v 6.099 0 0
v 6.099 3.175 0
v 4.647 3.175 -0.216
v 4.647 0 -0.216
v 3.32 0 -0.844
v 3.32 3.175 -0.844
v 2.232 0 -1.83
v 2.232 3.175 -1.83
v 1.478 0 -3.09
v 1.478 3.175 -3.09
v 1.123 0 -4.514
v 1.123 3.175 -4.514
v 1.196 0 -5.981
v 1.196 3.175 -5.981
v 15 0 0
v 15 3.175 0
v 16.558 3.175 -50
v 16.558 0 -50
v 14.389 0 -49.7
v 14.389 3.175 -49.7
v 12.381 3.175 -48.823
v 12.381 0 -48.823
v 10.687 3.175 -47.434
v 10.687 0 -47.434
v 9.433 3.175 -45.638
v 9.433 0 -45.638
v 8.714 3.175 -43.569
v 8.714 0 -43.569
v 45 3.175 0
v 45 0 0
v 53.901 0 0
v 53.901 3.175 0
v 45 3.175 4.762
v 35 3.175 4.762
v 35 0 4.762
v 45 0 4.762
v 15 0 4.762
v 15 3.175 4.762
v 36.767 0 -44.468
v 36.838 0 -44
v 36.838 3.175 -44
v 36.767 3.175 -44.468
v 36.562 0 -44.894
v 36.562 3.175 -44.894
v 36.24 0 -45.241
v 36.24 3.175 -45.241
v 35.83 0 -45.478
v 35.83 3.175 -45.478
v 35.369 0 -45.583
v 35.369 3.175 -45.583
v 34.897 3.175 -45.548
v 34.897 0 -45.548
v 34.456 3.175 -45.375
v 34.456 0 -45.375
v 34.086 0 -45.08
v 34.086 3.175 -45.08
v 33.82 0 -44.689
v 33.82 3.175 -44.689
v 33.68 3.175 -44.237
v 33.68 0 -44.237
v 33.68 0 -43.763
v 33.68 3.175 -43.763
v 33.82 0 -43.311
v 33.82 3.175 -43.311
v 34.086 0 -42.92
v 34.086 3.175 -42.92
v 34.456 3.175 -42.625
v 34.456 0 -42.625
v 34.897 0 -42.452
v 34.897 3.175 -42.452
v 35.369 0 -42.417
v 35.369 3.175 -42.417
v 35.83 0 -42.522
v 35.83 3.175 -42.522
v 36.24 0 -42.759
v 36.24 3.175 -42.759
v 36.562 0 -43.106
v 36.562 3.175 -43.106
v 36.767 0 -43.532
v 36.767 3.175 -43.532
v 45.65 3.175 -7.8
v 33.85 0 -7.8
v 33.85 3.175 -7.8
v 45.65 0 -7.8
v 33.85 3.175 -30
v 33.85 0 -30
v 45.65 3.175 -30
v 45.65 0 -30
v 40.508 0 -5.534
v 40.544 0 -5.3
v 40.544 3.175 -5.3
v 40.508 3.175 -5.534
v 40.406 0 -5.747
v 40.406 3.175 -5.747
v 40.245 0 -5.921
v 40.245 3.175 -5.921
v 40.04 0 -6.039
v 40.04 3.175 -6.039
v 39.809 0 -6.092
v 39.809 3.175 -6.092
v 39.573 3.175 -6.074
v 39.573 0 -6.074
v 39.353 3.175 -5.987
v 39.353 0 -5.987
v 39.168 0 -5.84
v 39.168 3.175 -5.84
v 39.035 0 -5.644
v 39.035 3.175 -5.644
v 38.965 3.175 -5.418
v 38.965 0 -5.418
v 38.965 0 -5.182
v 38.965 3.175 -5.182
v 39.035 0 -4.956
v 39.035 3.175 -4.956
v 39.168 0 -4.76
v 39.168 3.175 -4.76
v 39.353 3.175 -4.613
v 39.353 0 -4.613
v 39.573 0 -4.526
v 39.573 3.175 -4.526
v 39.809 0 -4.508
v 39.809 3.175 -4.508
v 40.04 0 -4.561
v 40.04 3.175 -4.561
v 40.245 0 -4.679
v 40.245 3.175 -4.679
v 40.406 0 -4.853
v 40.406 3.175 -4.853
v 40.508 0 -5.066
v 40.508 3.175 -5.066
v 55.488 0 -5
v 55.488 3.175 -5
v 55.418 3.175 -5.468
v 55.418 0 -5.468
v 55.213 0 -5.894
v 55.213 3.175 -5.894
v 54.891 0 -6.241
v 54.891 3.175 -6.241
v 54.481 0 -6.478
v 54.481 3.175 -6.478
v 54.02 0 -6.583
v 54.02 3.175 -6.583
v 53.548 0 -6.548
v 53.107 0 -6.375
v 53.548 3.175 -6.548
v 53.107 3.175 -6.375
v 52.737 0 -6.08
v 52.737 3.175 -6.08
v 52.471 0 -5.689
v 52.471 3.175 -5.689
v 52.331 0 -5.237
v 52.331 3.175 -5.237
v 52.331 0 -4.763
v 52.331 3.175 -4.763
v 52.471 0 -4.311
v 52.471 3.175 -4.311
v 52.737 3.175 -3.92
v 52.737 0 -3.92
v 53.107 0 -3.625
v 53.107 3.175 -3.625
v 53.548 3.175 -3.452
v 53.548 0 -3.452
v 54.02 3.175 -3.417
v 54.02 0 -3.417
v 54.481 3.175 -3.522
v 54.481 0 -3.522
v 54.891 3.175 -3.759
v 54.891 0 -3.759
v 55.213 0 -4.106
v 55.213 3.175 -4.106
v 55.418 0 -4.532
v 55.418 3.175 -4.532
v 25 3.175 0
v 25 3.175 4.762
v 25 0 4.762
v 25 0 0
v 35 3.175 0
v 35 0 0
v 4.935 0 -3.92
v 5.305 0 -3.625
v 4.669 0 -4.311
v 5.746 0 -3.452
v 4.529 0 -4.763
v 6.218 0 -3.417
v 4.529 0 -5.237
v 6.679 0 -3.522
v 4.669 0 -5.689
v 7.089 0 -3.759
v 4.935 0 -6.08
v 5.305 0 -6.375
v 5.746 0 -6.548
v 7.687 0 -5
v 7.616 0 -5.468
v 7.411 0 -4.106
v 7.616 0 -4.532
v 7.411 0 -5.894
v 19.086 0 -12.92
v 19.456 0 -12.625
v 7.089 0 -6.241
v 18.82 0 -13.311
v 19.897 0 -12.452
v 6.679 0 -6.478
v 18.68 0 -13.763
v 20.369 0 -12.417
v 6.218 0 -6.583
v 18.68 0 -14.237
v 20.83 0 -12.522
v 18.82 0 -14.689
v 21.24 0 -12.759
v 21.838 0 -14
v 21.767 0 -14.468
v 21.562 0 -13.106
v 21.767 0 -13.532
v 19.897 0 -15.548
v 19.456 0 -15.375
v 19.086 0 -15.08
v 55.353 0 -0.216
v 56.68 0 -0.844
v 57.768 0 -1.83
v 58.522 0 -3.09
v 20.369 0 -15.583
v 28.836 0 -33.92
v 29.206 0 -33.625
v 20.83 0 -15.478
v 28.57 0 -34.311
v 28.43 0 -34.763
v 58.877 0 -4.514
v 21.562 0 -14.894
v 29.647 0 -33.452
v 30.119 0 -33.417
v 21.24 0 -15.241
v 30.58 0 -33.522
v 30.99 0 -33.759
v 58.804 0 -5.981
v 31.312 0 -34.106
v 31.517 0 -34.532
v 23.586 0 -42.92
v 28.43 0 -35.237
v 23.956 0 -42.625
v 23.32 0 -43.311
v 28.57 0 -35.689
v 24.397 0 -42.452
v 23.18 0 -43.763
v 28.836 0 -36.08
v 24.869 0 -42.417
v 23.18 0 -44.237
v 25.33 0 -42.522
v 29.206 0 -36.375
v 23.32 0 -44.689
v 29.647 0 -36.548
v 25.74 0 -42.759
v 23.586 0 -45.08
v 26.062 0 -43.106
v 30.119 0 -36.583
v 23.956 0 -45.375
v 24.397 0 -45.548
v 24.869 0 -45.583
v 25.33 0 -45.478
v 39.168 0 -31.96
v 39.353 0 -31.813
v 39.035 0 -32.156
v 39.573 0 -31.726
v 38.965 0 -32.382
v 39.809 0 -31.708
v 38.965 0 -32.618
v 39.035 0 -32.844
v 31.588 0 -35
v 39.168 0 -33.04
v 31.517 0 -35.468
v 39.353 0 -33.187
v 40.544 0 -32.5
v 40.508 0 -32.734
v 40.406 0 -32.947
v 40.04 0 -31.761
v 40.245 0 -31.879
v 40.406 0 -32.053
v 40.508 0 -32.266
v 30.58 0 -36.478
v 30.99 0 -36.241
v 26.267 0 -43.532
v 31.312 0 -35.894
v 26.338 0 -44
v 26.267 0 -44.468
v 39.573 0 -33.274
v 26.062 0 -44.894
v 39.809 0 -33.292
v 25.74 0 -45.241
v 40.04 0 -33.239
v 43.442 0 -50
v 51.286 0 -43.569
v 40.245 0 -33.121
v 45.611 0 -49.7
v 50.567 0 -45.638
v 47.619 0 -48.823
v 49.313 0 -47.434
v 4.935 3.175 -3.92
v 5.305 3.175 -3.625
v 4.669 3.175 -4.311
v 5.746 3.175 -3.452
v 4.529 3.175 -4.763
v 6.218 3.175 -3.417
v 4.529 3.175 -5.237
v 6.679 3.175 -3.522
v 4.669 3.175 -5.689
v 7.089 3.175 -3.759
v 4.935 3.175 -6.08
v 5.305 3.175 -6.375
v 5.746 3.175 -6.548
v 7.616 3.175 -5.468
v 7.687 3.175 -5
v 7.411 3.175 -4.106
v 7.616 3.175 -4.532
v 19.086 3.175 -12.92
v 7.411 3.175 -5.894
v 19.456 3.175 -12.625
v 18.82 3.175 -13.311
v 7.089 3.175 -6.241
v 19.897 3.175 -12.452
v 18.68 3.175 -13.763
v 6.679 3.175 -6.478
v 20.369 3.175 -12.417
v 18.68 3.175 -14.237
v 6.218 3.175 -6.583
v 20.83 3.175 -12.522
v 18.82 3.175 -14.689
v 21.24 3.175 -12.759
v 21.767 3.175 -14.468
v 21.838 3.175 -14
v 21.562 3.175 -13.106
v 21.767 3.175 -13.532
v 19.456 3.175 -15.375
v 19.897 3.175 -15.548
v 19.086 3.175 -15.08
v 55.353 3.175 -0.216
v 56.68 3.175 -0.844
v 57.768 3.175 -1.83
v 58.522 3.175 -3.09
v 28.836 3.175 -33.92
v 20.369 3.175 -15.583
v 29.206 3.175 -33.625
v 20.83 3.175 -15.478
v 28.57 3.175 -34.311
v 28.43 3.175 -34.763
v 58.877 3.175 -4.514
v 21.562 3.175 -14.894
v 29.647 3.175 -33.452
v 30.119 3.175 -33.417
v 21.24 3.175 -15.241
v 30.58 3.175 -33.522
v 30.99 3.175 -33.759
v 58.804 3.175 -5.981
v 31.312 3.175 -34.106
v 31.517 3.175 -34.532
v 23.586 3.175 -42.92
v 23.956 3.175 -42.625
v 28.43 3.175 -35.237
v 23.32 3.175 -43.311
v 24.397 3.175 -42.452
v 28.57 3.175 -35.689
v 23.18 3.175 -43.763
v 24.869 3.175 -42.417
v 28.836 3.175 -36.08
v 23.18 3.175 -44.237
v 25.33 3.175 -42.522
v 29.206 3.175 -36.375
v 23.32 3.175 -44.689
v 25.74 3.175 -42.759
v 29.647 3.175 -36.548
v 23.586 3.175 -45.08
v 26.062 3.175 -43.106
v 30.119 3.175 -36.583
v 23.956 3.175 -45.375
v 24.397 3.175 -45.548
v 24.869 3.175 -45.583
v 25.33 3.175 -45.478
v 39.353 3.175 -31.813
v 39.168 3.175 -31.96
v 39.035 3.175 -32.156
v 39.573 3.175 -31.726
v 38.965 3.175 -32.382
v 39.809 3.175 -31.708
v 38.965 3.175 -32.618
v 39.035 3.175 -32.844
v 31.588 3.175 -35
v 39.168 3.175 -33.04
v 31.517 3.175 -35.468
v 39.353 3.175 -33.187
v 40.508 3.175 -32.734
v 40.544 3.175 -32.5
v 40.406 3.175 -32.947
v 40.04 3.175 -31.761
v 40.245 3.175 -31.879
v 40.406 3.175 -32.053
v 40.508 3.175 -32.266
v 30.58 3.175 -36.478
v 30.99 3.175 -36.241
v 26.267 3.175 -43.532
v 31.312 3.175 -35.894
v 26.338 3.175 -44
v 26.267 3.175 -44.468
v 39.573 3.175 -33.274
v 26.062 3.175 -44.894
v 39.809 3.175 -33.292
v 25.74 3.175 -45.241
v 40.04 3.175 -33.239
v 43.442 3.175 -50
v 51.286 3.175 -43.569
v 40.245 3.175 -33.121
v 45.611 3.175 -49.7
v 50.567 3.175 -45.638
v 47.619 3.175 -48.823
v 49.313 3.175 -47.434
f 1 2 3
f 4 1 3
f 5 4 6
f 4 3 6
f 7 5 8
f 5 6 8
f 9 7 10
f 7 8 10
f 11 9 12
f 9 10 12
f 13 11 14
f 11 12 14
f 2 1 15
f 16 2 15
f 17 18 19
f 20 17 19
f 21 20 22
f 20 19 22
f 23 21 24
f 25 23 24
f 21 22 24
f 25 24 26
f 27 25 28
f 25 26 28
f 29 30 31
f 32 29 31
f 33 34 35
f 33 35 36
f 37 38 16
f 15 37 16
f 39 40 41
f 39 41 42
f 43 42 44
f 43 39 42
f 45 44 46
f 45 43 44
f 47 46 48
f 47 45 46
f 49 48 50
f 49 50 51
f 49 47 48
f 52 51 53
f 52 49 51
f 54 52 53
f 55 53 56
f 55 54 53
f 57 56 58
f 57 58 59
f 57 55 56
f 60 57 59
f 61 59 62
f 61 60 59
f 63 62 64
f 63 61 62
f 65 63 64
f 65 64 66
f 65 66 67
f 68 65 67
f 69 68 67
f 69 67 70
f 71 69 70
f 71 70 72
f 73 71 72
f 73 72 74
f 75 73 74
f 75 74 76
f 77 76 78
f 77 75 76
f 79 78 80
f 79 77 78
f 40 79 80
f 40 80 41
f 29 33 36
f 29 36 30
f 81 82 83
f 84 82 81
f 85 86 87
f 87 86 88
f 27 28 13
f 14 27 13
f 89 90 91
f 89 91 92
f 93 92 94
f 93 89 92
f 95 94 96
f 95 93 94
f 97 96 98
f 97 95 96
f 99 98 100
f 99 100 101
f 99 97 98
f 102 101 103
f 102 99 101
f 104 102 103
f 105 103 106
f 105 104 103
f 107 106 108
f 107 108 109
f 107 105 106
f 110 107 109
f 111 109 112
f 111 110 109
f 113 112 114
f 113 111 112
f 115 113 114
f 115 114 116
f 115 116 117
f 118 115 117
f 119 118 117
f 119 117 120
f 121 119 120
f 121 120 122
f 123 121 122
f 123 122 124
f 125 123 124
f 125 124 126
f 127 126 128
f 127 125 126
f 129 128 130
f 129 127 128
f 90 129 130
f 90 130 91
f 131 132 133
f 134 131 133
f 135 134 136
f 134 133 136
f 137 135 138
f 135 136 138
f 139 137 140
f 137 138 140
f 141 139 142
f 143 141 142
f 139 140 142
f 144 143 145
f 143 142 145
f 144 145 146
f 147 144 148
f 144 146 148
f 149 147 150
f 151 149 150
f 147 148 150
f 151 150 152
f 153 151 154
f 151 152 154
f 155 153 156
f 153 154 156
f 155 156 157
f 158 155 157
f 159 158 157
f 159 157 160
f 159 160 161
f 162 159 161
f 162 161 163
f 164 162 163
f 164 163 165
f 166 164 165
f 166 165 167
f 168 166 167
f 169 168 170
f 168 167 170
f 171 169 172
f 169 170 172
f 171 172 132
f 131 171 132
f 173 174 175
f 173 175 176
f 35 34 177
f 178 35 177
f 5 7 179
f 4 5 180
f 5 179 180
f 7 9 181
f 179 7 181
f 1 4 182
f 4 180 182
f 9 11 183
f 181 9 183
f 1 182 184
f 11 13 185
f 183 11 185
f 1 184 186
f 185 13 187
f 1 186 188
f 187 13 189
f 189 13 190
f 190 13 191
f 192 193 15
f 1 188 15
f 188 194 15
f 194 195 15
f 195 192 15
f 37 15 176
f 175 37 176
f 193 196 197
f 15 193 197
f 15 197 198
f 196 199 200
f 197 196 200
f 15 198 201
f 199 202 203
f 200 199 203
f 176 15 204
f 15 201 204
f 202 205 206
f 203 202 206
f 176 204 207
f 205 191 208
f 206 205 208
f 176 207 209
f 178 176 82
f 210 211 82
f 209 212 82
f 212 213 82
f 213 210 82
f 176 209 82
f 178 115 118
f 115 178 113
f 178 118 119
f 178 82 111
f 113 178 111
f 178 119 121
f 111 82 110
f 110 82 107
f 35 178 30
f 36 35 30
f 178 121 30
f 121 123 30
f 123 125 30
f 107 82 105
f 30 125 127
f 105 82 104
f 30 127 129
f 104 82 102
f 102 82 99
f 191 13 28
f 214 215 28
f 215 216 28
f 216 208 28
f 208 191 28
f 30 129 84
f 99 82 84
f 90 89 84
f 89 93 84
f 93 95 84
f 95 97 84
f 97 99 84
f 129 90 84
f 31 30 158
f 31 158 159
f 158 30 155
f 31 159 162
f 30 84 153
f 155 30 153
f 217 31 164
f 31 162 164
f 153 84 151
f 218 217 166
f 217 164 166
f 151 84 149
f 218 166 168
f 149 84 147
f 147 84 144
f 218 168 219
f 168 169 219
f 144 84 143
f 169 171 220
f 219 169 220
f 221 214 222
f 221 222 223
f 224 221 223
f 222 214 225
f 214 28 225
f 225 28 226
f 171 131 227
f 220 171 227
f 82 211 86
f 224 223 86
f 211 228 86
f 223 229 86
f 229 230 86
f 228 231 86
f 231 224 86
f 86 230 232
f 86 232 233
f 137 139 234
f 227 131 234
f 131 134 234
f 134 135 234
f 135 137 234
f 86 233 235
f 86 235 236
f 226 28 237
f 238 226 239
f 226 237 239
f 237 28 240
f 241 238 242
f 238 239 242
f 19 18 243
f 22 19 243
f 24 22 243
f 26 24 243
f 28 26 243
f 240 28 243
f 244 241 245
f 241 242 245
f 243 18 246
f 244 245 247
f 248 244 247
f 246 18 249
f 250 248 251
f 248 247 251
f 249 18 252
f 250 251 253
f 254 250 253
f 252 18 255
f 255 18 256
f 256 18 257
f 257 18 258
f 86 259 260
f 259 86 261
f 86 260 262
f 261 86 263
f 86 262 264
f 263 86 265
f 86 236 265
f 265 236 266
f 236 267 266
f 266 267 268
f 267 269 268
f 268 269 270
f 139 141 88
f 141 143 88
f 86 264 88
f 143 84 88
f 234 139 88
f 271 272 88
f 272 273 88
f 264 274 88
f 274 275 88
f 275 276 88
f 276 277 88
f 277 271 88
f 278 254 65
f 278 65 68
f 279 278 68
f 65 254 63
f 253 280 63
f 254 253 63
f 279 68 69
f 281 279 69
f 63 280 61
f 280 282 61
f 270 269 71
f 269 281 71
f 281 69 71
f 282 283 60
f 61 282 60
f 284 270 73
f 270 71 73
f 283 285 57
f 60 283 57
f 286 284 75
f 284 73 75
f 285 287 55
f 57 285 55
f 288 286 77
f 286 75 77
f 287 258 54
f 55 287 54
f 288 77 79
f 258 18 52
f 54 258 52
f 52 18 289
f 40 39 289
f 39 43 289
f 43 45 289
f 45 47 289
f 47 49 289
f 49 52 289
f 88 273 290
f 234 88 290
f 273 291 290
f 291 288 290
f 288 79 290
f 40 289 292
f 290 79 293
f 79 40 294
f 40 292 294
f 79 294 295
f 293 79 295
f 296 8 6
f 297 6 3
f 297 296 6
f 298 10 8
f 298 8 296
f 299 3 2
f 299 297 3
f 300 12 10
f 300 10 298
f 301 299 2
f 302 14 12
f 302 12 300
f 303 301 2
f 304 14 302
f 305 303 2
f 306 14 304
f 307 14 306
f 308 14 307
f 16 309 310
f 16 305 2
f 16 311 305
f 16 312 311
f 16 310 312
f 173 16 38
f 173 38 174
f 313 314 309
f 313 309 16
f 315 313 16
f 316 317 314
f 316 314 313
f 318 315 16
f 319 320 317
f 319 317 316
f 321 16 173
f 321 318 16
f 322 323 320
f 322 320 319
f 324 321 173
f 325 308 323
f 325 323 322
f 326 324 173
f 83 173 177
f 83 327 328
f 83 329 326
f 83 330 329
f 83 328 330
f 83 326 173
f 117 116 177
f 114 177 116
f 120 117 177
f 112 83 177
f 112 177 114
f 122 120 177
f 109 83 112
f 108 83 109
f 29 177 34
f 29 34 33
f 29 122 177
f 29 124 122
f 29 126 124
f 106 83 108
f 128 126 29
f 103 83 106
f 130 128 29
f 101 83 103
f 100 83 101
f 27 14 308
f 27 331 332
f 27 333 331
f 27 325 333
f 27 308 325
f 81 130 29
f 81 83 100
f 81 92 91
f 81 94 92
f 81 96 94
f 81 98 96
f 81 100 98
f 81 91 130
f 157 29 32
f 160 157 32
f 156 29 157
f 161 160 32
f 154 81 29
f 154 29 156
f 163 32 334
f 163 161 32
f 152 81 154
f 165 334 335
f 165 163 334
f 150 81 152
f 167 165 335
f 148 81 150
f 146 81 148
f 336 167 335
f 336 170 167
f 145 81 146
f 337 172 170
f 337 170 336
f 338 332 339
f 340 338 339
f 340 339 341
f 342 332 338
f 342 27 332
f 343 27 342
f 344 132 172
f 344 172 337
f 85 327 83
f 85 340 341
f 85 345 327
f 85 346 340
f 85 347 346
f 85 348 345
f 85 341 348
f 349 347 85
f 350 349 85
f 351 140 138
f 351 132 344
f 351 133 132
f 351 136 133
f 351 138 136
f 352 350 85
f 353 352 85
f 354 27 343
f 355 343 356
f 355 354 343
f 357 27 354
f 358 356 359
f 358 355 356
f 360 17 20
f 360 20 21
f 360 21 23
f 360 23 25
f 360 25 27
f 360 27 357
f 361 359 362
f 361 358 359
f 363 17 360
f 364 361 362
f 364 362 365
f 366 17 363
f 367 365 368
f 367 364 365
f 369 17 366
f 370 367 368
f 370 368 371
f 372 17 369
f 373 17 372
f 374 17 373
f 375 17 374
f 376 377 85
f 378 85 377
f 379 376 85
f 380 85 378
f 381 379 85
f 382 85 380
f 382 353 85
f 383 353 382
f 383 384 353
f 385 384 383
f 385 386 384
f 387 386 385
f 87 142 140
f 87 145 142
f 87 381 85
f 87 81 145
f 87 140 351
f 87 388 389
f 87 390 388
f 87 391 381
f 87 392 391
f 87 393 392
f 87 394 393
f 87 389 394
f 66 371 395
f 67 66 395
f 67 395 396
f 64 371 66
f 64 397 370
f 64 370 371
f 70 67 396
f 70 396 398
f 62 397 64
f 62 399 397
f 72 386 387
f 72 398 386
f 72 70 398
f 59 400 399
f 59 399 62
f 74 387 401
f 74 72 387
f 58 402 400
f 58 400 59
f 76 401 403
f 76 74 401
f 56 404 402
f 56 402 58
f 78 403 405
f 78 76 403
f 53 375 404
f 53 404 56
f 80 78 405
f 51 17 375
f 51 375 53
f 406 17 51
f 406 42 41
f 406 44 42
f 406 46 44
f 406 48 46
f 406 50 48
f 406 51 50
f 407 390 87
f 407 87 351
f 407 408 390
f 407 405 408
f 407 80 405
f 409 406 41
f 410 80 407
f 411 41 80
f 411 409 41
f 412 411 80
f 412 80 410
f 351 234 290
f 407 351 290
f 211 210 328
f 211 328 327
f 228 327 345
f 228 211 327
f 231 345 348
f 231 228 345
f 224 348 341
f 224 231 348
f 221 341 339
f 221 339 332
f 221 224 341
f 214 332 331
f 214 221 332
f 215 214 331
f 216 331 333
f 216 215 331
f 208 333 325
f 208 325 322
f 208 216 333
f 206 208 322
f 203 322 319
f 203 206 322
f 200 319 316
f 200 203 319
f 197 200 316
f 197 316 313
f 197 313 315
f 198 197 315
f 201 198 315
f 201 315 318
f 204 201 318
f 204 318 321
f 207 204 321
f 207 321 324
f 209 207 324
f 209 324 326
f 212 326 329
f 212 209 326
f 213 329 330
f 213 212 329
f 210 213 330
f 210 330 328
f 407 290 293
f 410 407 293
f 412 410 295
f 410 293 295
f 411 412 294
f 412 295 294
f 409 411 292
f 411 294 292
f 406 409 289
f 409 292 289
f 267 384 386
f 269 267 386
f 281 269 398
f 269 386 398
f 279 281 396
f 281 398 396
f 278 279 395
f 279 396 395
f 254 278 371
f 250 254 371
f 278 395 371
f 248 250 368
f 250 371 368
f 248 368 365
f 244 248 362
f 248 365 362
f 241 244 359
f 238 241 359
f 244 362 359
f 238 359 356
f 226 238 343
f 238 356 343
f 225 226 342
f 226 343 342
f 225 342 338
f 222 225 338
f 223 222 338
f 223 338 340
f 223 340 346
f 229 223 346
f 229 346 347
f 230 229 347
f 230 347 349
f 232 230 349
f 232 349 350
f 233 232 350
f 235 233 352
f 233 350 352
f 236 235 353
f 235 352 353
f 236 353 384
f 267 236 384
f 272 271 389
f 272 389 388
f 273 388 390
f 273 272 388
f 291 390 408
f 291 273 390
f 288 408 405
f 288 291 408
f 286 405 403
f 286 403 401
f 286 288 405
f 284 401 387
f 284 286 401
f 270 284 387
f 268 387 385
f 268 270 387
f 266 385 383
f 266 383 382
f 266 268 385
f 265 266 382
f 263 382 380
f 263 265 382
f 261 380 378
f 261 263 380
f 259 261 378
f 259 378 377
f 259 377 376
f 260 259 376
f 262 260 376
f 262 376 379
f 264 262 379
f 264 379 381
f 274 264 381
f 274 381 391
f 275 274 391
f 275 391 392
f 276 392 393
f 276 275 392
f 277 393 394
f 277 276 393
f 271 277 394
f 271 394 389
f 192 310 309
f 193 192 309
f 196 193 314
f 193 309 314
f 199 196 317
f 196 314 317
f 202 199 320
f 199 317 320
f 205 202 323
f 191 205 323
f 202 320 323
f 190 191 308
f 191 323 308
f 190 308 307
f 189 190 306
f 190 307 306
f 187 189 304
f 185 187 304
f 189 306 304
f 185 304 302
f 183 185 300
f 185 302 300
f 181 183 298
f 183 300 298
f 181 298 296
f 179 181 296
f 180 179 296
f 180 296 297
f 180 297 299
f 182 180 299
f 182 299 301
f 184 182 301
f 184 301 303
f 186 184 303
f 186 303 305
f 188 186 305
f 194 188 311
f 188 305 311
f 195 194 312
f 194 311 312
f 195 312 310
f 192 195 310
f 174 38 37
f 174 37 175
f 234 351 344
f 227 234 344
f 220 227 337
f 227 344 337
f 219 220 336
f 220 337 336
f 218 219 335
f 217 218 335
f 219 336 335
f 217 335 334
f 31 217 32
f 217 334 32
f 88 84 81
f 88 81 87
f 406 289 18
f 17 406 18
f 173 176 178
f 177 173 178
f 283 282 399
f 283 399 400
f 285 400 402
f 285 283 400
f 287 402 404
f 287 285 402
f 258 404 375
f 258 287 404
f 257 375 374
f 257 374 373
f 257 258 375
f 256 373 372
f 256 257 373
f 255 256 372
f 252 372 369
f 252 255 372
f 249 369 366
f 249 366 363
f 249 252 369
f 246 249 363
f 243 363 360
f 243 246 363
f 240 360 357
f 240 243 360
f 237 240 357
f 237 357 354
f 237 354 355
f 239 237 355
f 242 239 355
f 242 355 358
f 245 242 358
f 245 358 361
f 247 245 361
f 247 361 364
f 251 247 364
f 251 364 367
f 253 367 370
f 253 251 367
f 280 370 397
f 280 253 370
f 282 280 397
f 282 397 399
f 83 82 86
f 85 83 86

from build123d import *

# Parameters (mm, degrees)
CROQUIS1_R              = 0.79375
CROQUIS1_R_2            = 1.5875
CROQUIS1_W              = 11.8
CROQUIS1_H              = 22.2
SALIENTE_EXTRUIR1_DEPTH = 3.175
CROQUIS2_R              = 1.5875
CORTAR_EXTRUIR1_DEPTH   = 3.175
CROQUIS3_W              = 10
CROQUIS3_H              = 4.7625
SALIENTE_EXTRUIR2_DEPTH = 3.175


with BuildPart() as part:
    # Croquis1 → Saliente-Extruir1 (new body)
    with BuildSketch(Plane(origin=(0, 0, 0), x_dir=(1, 0, 0), z_dir=(0, 1, 0))):
        with BuildLine():
            Line((8.713785816, 43.568929081), (0, 0))
            Line((0, 0), (60, 0))
            Line((60, 0), (51.286214184, 43.568929081))
            ThreePointArc((51.286214184, 43.568929081), (48.513480023, 48.186737131), (43.441568778, 50))
            Line((43.441568778, 50), (16.558431222, 50))
            ThreePointArc((16.558431222, 50), (11.486519977, 48.186737131), (8.713785816, 43.568929081))
        make_face()
        with Locations((39.75, 5.3)):
            Circle(CROQUIS1_R, mode=Mode.SUBTRACT)
        with Locations((39.75, 32.5)):
            Circle(CROQUIS1_R, mode=Mode.SUBTRACT)
        with Locations((20.25, 14)):
            Circle(CROQUIS1_R_2, mode=Mode.SUBTRACT)
        with Locations((24.75, 44)):
            Circle(CROQUIS1_R_2, mode=Mode.SUBTRACT)
        with Locations((35.25, 44)):
            Circle(CROQUIS1_R_2, mode=Mode.SUBTRACT)
        with Locations((39.75, 18.9)):
            Rectangle(CROQUIS1_W, CROQUIS1_H, mode=Mode.SUBTRACT)
    extrude(amount=SALIENTE_EXTRUIR1_DEPTH)

    # Croquis2 → Cortar-Extruir1 (cut)
    with BuildSketch(Plane(origin=(0, 3.175, 0), x_dir=(1, 0, 0), z_dir=(0, 1, 0))):
        with Locations((30, 35)):
            Circle(CROQUIS2_R)
        with Locations((6.099019514, 5)):
            Circle(CROQUIS2_R)
        with Locations((53.900980486, 5)):
            Circle(CROQUIS2_R)
        with BuildLine():
            Line((53.900980486, 0), (60, 0))
            Line((60, 0), (58.803883865, 5.980580676))
            ThreePointArc((58.803883865, 5.980580676), (57.767691193, 1.830055472), (53.900980486, 0))
        make_face()
        with BuildLine():
            Line((1.196116135, 5.980580676), (0, 0))
            Line((0, 0), (6.099019514, 0))
            ThreePointArc((6.099019514, 0), (2.232308807, 1.830055472), (1.196116135, 5.980580676))
        make_face()
    extrude(amount=-CORTAR_EXTRUIR1_DEPTH, mode=Mode.SUBTRACT)

    # Croquis3 → Saliente-Extruir2 (add)
    with BuildSketch(Plane(origin=(0, 3.175, 0), x_dir=(1, 0, 0), z_dir=(0, 1, 0))):
        with Locations((20, -2.38125)):
            Rectangle(CROQUIS3_W, CROQUIS3_H)
        with Locations((40, -2.38125)):
            Rectangle(CROQUIS3_W, CROQUIS3_H)
    extrude(amount=-SALIENTE_EXTRUIR2_DEPTH)


solid = part.part
